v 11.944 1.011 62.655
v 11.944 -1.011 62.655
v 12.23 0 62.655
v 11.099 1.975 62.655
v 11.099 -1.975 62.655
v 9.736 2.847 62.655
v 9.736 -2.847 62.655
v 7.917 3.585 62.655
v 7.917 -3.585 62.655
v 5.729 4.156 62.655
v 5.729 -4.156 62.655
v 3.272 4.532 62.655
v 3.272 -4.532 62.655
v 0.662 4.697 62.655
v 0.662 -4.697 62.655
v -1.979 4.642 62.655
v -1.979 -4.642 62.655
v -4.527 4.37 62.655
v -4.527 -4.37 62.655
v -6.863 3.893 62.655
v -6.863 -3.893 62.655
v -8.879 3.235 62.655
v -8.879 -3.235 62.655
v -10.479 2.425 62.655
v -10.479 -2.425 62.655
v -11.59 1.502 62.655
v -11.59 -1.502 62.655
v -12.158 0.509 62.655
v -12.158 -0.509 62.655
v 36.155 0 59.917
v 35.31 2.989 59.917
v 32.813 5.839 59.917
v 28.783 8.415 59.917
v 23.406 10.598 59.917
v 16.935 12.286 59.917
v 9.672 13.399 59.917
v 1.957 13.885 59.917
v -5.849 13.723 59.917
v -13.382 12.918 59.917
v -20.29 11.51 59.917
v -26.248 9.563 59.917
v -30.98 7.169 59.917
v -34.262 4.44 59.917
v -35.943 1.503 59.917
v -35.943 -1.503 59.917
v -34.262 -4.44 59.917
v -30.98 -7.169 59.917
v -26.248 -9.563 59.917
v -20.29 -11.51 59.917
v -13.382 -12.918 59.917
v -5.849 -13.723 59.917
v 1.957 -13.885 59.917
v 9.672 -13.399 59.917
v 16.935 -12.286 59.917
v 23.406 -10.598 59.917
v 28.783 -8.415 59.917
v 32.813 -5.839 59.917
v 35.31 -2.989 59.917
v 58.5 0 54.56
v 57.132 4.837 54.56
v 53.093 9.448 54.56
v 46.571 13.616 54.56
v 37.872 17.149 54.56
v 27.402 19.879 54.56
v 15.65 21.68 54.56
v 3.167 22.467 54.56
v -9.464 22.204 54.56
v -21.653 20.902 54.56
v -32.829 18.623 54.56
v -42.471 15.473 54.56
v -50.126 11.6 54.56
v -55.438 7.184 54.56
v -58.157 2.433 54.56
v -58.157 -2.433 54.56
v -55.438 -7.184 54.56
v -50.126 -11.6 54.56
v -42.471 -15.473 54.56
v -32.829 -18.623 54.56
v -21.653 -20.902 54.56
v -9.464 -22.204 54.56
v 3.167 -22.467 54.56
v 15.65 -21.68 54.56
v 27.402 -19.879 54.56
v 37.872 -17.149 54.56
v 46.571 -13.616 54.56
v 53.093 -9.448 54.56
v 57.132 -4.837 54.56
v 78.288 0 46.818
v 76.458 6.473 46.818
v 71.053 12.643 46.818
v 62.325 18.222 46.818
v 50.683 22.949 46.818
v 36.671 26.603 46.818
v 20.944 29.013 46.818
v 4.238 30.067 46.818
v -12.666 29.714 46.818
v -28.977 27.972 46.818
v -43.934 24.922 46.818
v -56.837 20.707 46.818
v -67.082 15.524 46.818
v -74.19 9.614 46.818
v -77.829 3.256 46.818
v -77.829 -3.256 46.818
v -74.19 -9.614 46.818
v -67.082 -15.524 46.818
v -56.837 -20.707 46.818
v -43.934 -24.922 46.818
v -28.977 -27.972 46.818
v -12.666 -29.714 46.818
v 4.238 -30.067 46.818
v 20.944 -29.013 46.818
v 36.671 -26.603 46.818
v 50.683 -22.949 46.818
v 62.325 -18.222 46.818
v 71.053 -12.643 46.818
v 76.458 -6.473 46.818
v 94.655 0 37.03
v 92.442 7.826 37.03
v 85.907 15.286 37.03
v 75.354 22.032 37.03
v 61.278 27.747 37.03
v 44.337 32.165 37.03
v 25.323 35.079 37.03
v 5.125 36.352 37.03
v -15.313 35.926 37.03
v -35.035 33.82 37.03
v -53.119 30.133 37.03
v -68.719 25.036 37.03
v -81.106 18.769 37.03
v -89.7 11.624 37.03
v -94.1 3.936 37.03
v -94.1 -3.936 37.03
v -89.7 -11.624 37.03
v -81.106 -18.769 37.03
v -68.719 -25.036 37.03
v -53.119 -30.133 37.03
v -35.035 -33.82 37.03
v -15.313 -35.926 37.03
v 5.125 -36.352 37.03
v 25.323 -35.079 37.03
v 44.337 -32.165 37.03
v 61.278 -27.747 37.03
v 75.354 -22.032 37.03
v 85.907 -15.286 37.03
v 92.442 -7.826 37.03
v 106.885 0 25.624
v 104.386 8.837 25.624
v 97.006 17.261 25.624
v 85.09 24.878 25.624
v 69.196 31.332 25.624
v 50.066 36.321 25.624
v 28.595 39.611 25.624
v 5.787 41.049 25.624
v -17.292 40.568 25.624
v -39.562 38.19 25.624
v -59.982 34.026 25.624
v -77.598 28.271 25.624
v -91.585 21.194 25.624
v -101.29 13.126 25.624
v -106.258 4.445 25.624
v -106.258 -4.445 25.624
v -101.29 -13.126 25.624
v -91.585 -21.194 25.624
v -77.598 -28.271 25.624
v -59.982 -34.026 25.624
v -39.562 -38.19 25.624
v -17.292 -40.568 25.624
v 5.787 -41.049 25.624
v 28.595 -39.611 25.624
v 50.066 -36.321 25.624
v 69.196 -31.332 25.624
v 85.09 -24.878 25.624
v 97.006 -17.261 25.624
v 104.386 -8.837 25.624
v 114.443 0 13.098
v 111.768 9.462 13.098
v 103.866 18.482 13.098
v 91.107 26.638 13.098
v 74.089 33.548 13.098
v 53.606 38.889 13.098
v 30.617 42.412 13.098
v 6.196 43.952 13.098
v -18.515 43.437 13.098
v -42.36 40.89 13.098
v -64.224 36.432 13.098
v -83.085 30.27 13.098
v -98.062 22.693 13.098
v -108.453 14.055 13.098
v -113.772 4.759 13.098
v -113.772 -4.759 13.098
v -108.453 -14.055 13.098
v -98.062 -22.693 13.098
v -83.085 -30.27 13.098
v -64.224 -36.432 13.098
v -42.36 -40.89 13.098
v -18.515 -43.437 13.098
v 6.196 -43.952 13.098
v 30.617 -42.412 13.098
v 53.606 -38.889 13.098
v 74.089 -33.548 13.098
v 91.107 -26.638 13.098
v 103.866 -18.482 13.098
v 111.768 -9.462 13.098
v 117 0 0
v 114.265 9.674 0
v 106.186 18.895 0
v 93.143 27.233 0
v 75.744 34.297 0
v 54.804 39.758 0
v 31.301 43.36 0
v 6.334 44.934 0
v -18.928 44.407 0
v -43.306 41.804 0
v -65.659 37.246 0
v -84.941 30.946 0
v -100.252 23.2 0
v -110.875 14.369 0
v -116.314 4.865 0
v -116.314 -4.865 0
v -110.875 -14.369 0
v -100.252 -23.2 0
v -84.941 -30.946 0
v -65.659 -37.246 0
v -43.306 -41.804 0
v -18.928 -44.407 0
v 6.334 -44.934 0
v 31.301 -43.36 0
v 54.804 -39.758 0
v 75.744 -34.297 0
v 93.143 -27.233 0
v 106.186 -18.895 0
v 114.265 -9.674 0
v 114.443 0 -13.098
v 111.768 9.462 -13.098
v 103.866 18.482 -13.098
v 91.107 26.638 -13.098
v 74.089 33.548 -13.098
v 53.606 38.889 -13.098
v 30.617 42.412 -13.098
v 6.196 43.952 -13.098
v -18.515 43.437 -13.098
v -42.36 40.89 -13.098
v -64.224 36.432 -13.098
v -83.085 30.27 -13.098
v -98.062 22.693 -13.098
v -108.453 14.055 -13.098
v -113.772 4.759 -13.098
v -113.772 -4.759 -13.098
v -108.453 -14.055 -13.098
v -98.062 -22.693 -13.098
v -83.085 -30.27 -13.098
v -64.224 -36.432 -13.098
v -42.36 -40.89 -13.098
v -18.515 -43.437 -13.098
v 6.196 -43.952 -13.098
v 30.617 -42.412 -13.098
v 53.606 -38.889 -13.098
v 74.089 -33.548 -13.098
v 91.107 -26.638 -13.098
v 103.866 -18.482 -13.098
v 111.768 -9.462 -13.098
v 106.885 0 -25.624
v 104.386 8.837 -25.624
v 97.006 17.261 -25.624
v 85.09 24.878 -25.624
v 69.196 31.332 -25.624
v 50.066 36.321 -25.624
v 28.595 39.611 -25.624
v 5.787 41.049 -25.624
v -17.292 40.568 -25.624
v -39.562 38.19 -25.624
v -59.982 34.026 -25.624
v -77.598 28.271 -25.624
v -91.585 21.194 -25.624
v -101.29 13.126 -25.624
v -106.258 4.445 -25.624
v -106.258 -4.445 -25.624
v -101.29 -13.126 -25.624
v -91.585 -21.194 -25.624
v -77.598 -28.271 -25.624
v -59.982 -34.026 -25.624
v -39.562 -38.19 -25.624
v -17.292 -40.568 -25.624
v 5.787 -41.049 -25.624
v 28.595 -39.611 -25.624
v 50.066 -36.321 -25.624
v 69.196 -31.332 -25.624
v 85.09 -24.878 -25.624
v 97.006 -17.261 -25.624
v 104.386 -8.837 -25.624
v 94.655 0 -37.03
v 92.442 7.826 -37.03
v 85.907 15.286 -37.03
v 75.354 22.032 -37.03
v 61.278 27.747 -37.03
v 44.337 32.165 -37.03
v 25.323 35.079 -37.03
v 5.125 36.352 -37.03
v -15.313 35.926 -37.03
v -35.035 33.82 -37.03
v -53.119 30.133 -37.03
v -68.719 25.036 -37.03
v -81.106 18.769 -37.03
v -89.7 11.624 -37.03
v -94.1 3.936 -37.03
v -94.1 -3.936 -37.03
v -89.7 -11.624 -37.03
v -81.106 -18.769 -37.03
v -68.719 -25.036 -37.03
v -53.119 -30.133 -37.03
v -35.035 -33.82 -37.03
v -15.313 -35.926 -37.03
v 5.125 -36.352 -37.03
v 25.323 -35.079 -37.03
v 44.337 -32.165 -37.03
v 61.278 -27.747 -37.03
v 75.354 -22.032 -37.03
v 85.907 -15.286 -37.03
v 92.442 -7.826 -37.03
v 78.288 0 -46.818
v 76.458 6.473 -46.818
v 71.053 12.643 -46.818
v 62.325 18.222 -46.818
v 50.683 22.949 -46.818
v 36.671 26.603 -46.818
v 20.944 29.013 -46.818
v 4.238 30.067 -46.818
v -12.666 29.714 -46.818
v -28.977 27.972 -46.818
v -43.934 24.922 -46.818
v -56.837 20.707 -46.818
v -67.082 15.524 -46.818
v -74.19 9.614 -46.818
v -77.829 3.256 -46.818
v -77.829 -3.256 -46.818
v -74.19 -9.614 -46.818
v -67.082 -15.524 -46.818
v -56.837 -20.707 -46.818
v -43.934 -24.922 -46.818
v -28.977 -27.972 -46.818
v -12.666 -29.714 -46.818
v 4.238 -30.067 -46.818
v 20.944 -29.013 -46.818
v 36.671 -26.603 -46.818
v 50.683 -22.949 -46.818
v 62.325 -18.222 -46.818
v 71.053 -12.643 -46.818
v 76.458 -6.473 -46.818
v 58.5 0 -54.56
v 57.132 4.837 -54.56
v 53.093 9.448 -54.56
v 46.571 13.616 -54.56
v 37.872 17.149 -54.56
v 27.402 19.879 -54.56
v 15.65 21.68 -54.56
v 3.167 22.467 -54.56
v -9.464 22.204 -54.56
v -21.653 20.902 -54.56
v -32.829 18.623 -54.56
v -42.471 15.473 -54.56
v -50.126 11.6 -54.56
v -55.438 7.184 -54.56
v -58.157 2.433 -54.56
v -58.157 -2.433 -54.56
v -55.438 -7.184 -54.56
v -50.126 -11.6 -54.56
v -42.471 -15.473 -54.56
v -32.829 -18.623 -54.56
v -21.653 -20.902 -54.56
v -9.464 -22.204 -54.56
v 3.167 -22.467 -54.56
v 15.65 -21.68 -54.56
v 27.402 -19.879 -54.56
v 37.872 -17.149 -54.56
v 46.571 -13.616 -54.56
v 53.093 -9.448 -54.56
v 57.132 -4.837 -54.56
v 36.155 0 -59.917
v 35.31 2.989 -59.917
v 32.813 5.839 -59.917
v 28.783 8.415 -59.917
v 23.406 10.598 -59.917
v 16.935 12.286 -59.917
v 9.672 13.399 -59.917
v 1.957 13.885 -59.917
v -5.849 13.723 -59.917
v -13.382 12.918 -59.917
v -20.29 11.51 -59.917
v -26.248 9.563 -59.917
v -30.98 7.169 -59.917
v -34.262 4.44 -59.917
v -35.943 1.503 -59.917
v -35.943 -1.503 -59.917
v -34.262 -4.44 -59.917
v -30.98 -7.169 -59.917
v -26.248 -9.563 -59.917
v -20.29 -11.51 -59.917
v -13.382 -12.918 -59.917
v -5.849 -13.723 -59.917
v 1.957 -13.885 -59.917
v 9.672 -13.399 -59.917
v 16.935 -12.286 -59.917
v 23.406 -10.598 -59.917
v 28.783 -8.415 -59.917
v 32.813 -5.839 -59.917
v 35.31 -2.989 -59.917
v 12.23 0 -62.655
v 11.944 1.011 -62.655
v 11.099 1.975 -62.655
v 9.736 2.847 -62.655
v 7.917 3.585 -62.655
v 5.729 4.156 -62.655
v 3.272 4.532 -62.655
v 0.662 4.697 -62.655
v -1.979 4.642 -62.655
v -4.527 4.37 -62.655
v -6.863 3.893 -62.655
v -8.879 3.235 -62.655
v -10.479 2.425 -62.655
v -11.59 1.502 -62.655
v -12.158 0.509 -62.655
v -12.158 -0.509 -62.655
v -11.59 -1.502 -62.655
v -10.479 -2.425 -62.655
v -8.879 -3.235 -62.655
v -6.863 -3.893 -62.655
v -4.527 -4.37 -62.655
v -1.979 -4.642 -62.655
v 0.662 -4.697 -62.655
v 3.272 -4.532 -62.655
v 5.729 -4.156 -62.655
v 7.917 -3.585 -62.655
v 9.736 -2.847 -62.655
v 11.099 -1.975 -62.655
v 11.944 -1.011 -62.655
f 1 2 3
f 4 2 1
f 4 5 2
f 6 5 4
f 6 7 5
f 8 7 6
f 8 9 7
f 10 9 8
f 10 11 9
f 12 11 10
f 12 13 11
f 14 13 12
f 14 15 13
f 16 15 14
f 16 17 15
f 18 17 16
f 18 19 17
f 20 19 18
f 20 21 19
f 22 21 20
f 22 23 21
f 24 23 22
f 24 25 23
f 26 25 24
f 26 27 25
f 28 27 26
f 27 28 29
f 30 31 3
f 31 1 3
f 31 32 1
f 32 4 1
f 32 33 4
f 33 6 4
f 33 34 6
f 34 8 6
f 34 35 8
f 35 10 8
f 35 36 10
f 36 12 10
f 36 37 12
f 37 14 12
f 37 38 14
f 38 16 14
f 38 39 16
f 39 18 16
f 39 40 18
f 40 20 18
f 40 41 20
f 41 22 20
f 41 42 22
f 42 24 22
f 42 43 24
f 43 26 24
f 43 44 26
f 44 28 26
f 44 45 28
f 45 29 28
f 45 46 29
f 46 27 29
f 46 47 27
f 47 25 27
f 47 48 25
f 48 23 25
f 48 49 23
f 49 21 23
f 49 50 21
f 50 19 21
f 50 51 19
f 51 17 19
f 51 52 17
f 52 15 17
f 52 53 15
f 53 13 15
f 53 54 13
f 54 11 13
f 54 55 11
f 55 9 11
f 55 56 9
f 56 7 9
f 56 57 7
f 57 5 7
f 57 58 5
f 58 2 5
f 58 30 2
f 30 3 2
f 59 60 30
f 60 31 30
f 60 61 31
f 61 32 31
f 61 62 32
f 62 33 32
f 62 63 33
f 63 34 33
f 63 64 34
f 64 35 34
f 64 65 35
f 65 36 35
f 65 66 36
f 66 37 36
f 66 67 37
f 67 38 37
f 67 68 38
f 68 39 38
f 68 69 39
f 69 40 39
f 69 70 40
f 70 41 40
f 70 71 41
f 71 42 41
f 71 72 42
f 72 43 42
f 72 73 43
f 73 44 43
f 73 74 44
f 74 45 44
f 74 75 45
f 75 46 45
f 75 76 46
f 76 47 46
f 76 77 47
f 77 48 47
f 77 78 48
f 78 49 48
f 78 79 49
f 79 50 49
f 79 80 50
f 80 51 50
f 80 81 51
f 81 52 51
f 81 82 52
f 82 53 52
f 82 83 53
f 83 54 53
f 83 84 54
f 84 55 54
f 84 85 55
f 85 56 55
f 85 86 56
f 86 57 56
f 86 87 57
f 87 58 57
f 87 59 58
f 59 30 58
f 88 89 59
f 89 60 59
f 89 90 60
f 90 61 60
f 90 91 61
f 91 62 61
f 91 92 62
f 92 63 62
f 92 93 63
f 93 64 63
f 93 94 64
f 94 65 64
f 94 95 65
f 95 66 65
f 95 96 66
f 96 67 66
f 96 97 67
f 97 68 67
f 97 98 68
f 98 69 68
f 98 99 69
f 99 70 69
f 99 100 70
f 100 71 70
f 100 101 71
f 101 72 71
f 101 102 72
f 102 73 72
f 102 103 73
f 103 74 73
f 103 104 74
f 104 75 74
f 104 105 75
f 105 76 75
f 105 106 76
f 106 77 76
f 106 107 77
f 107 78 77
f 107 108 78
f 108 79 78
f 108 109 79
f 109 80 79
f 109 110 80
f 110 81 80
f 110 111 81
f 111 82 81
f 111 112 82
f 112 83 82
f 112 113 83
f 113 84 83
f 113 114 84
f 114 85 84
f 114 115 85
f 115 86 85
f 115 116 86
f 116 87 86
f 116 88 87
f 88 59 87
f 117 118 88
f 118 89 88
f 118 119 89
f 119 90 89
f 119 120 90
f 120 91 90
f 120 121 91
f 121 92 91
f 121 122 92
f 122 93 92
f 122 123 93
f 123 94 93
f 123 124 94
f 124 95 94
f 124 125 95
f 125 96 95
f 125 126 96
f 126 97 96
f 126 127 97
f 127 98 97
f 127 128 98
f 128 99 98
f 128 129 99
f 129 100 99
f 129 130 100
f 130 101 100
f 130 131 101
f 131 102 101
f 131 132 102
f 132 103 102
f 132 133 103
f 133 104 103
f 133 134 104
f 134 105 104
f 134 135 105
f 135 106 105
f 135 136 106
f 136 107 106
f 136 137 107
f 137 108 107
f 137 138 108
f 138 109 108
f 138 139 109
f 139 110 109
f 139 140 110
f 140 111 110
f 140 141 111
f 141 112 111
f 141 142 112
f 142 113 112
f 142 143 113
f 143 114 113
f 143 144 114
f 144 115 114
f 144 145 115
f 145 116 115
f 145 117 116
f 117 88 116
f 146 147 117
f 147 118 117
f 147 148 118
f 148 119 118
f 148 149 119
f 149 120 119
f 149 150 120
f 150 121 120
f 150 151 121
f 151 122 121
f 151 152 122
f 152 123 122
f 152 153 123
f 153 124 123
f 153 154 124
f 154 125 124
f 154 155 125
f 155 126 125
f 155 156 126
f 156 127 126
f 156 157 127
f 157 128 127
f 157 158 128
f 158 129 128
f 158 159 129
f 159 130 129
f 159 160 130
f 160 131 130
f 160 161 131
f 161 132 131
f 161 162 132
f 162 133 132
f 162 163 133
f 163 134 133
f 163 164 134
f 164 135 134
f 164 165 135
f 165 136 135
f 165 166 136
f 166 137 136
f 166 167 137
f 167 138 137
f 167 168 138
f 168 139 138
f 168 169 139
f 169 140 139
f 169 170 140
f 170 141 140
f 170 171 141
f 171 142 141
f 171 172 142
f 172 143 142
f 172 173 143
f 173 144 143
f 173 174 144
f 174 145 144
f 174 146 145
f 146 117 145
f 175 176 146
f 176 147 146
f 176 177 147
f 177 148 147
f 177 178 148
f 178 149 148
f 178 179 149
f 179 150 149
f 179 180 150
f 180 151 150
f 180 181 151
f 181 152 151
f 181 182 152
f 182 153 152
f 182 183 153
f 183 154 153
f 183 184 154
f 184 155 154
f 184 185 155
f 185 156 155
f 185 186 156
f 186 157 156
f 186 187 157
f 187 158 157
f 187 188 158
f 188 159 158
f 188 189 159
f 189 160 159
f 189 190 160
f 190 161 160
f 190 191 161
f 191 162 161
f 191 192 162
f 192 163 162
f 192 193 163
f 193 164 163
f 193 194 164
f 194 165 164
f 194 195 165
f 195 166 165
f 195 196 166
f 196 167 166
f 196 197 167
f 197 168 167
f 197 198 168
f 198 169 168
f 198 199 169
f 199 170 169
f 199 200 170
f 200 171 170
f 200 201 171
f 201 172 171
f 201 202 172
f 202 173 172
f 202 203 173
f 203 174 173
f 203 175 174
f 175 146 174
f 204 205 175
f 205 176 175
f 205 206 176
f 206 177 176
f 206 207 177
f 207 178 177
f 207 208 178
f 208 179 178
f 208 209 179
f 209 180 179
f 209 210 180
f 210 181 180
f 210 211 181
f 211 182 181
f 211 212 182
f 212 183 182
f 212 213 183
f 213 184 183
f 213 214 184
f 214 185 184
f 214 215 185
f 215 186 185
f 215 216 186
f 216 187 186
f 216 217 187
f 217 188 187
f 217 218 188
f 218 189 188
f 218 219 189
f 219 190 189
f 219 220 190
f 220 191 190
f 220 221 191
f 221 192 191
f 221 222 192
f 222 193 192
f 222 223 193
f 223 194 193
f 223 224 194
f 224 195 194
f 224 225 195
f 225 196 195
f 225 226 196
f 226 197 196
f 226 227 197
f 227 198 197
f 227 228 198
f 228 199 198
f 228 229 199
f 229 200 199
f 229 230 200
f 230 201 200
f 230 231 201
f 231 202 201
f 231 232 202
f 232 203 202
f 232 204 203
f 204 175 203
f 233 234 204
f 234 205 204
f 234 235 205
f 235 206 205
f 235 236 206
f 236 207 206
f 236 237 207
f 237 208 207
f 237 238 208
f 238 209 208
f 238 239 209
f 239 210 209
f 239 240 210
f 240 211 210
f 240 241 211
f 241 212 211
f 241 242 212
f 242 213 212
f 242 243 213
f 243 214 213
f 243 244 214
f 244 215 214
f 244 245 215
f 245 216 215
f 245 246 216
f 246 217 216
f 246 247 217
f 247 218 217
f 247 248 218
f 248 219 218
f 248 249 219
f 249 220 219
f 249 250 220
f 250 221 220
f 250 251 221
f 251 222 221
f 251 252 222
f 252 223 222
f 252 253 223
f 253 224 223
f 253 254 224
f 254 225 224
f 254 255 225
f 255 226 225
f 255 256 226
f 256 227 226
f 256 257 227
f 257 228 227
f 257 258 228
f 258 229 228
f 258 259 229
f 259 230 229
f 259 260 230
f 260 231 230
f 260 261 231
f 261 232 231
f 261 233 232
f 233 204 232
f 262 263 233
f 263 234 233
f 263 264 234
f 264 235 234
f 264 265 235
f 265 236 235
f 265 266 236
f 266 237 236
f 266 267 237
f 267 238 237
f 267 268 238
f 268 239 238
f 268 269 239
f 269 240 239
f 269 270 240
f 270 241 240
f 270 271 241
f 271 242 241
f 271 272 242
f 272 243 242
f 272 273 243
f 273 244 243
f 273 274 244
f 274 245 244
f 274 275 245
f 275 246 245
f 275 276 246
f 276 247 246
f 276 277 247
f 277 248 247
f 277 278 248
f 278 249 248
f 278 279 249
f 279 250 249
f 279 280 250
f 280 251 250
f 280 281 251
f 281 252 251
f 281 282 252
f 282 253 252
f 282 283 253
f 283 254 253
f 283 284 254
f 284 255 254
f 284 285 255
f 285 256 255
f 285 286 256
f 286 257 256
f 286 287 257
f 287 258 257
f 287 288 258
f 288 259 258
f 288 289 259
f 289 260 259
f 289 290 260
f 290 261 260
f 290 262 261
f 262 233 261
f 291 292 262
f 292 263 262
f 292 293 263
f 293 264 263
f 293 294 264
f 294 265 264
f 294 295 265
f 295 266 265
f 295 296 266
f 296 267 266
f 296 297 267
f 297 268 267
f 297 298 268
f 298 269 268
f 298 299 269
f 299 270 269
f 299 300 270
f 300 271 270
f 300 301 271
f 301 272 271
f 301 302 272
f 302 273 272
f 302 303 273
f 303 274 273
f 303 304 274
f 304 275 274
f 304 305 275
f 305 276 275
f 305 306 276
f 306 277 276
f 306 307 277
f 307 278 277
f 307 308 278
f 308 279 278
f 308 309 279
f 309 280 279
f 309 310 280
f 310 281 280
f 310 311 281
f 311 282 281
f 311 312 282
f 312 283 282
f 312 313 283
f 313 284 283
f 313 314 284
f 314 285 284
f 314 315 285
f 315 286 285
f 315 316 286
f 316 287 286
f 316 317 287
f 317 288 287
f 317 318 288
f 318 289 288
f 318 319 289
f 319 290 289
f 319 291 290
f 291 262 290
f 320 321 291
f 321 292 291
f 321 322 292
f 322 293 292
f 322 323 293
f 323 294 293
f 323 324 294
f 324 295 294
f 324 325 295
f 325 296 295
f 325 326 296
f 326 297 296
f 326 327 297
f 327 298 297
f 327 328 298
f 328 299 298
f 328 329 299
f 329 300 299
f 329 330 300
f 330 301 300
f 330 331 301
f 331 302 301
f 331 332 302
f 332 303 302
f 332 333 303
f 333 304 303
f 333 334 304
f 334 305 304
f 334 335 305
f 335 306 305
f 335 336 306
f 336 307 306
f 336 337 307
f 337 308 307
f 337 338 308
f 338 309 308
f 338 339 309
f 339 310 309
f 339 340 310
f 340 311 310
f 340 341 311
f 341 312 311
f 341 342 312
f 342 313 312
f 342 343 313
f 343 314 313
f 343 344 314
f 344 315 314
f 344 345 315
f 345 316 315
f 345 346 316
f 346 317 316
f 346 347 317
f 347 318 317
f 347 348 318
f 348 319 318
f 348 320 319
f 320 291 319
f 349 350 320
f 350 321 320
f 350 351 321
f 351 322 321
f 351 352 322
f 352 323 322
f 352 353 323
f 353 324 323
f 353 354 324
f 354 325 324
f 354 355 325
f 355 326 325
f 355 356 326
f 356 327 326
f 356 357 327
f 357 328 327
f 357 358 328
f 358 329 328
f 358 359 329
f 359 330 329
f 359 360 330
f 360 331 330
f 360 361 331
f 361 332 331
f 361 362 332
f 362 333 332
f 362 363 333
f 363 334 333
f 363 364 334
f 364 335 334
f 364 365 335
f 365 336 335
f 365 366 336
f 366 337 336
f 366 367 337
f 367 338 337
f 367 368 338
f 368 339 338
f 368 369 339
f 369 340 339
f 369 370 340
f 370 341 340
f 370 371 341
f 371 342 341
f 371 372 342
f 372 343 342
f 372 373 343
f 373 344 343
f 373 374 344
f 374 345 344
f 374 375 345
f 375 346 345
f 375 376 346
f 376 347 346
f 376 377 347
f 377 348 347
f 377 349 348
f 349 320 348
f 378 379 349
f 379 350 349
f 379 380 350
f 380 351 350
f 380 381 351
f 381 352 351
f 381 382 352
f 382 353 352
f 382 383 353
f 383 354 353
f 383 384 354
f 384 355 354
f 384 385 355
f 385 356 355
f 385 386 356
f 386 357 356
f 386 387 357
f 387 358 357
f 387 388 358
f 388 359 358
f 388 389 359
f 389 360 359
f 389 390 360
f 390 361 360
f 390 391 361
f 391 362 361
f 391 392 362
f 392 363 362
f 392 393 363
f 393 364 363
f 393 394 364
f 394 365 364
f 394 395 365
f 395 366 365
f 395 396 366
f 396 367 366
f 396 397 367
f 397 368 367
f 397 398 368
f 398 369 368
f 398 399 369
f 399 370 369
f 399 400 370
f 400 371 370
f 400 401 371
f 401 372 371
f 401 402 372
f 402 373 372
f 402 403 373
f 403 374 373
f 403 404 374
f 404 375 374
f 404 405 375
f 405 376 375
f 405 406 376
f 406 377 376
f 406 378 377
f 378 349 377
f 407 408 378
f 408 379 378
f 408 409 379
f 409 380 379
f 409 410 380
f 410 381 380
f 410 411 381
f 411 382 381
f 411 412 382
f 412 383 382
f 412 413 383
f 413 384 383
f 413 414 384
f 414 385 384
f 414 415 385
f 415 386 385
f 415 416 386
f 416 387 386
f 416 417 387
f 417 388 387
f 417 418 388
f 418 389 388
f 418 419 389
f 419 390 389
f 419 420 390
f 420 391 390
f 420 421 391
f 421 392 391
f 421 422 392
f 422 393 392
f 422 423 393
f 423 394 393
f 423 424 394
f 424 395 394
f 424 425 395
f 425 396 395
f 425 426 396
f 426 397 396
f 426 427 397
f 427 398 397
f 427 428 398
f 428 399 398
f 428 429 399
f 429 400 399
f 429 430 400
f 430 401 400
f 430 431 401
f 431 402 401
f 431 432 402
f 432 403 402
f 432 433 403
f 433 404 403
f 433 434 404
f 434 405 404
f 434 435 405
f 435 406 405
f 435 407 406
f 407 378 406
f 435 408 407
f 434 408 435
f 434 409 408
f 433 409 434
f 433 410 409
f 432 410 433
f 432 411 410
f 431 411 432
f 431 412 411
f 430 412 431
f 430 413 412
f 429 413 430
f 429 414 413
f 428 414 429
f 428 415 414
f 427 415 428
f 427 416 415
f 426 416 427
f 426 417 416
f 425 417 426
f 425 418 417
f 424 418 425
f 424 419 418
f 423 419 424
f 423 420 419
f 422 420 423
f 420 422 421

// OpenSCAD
// Generated by SolidPython 1.0.1 on 2020-07-29 00:46:50


scale(v = [13, 5, 7]) {
	sphere(r = 9);
}
/***********************************************
*********      SolidPython code:      **********
************************************************
 
# import packages: SolidPython
from solid import *
from solid.utils import *
from itertools import chain, combinations, permutations


class Resize:

    def __init__(self, scad_file):
        self.scad_file = scad_file
        #self.scad_file = import_scad(scad_file)
        # cone/cylinder param:
        self.r1 = 0
        self.r2 = 0
        self.h = 0
        # rectangular prism param:
        self.w = 0
        self.l = 0
        # ellipse param:
        self.r = 0

    # import OpenScad code (file name corresponds to shape)


    # classify shape + parameters
    def assign(self, param1, param2, param3):
        if self.scad_file == 'cone.scad':
            self.r1 = param1
            self.r2 = param2
            self.h = param3
        elif self.scad_file == 'cylinder.scad':
            self.r1 = param1
            self.r2 = param2
            self.h = param3
        elif self.scad_file == 'rectangularPrism.scad':
            self.h = param1
            self.l = param2
            self.w = param3
        else:
            self.r = param1
            self.h = param2

    # resize parameters
    def iterate(self):
        x = range(3, 20, 2)
        i = 1
        if self.scad_file == 'cone.scad':
            tempList = list(permutations(x, 2))
            for temp in tempList:
                param1 = temp[0]
                param2 = temp[1]
                filepath = 'produced_scad_files/' + 'cone' + str(param1) + '_' + str(param2) + '_' + '.scad'
                scad_render_to_file(cylinder(h=param1, r1=param2, r2=0), filepath)

        elif self.scad_file == 'cylinder.scad':
            tempList = list(permutations(x, 3))
            for temp in tempList:
                param1 = temp[0]
                param2 = temp[1]
                filepath = 'produced_scad_files/' + 'cylinder' + str(param1) + '_' + str(param2) + '_' + '.scad'
                scad_render_to_file(cylinder(h=param1, r1=param2, r2=param2), filepath)

        elif self.scad_file == 'rectangularPrism.scad':
            tempList = list(permutations(x, 3))
            for temp in tempList:
                param1 = temp[0]
                param2 = temp[1]
                param3 = temp[2]
                filepath = 'produced_scad_files/' + 'rectangularPrism' + str(param1) + '_' + str(param2) + '_' + str(
                    param3) + '.scad'
                scad_render_to_file(cube(size=(param1, param2, param3)), filepath)

        elif self.scad_file == 'ellipse.scad':
            tempList = list(permutations(x, 4))
            for temp in tempList:
                param1 = temp[0]
                param2 = temp[1]
                param3 = temp[2]
                param4 = temp[3]
                filepath = 'produced_scad_files/' + 'ellipse' + str(param1) + '_' + str(param2) + '_' + str(param3) + '_' + str(param4) + '.scad'
                scad_render_to_file(scale([param1, param2, param3])(sphere(r=param4)), filepath)

    def render_to_scadfile(self):
        scad_render_to_file(scad, 'example.scad') 
 
************************************************/
